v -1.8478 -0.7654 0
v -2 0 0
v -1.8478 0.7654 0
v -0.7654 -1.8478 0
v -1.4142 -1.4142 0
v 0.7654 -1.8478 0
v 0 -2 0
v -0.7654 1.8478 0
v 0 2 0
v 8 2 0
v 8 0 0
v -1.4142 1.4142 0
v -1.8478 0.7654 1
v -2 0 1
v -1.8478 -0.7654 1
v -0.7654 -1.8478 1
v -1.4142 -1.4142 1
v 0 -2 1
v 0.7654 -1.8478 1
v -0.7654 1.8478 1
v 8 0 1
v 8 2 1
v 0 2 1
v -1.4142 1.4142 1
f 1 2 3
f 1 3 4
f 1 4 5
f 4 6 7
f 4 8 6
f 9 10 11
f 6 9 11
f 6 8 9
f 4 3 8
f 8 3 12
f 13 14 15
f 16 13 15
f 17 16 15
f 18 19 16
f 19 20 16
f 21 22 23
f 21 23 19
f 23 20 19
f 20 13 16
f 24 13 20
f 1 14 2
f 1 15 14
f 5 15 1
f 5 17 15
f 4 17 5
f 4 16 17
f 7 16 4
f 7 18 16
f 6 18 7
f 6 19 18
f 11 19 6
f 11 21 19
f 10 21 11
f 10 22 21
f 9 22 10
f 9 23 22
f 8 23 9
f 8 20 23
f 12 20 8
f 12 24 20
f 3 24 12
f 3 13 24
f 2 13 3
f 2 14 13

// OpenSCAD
// 2D hull
linear_extrude(1) hull() {
  circle(2, $fn = 16);
  translate([6, 0]) square(2);
}
